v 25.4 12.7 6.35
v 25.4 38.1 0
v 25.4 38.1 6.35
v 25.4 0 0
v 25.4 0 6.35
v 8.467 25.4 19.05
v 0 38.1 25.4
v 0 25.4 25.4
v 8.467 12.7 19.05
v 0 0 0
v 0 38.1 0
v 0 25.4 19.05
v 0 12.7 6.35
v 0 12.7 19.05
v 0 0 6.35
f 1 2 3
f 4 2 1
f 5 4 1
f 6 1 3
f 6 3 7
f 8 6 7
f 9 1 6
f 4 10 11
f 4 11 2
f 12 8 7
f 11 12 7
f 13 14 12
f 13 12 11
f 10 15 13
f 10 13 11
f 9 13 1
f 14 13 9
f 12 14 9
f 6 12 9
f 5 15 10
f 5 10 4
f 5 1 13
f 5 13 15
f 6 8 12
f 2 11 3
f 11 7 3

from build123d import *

# Parameters (mm, degrees)
F0_W     = 25.4
F0_H     = 6.35
F1_DEPTH = 38.1
F2_W     = 12.7
F2_H     = 19.05
F3_DEPTH = 25.4
F5_DEPTH = 12.7


with BuildPart() as f1:
    # F0 (on Front) → F1 (new body)
    with BuildSketch(Plane.XZ):
        with Locations((12.7, 3.175)):
            Rectangle(F0_W, F0_H)
        Polygon((0, 25.4), (0, 6.35), (25.4, 6.35), align=None)
    extrude(amount=-F1_DEPTH)

    # F2 (on face) → F3 (cut)
    with BuildSketch(Plane(origin=(0, 0, 0), x_dir=(0, -1, 0), z_dir=(-1, 0, 0))):
        with Locations((-6.35, 15.875)):
            Rectangle(F2_W, F2_H)
    extrude(amount=-F3_DEPTH, mode=Mode.SUBTRACT)

    # F4 (on face) → F5 (cut)
    with BuildSketch(Plane.XZ.offset(-12.7)):
        Polygon((0, 25.4), (0, 19.05), (8.466667, 19.05), align=None)
    extrude(amount=-F5_DEPTH, mode=Mode.SUBTRACT)


solid = f1.part
